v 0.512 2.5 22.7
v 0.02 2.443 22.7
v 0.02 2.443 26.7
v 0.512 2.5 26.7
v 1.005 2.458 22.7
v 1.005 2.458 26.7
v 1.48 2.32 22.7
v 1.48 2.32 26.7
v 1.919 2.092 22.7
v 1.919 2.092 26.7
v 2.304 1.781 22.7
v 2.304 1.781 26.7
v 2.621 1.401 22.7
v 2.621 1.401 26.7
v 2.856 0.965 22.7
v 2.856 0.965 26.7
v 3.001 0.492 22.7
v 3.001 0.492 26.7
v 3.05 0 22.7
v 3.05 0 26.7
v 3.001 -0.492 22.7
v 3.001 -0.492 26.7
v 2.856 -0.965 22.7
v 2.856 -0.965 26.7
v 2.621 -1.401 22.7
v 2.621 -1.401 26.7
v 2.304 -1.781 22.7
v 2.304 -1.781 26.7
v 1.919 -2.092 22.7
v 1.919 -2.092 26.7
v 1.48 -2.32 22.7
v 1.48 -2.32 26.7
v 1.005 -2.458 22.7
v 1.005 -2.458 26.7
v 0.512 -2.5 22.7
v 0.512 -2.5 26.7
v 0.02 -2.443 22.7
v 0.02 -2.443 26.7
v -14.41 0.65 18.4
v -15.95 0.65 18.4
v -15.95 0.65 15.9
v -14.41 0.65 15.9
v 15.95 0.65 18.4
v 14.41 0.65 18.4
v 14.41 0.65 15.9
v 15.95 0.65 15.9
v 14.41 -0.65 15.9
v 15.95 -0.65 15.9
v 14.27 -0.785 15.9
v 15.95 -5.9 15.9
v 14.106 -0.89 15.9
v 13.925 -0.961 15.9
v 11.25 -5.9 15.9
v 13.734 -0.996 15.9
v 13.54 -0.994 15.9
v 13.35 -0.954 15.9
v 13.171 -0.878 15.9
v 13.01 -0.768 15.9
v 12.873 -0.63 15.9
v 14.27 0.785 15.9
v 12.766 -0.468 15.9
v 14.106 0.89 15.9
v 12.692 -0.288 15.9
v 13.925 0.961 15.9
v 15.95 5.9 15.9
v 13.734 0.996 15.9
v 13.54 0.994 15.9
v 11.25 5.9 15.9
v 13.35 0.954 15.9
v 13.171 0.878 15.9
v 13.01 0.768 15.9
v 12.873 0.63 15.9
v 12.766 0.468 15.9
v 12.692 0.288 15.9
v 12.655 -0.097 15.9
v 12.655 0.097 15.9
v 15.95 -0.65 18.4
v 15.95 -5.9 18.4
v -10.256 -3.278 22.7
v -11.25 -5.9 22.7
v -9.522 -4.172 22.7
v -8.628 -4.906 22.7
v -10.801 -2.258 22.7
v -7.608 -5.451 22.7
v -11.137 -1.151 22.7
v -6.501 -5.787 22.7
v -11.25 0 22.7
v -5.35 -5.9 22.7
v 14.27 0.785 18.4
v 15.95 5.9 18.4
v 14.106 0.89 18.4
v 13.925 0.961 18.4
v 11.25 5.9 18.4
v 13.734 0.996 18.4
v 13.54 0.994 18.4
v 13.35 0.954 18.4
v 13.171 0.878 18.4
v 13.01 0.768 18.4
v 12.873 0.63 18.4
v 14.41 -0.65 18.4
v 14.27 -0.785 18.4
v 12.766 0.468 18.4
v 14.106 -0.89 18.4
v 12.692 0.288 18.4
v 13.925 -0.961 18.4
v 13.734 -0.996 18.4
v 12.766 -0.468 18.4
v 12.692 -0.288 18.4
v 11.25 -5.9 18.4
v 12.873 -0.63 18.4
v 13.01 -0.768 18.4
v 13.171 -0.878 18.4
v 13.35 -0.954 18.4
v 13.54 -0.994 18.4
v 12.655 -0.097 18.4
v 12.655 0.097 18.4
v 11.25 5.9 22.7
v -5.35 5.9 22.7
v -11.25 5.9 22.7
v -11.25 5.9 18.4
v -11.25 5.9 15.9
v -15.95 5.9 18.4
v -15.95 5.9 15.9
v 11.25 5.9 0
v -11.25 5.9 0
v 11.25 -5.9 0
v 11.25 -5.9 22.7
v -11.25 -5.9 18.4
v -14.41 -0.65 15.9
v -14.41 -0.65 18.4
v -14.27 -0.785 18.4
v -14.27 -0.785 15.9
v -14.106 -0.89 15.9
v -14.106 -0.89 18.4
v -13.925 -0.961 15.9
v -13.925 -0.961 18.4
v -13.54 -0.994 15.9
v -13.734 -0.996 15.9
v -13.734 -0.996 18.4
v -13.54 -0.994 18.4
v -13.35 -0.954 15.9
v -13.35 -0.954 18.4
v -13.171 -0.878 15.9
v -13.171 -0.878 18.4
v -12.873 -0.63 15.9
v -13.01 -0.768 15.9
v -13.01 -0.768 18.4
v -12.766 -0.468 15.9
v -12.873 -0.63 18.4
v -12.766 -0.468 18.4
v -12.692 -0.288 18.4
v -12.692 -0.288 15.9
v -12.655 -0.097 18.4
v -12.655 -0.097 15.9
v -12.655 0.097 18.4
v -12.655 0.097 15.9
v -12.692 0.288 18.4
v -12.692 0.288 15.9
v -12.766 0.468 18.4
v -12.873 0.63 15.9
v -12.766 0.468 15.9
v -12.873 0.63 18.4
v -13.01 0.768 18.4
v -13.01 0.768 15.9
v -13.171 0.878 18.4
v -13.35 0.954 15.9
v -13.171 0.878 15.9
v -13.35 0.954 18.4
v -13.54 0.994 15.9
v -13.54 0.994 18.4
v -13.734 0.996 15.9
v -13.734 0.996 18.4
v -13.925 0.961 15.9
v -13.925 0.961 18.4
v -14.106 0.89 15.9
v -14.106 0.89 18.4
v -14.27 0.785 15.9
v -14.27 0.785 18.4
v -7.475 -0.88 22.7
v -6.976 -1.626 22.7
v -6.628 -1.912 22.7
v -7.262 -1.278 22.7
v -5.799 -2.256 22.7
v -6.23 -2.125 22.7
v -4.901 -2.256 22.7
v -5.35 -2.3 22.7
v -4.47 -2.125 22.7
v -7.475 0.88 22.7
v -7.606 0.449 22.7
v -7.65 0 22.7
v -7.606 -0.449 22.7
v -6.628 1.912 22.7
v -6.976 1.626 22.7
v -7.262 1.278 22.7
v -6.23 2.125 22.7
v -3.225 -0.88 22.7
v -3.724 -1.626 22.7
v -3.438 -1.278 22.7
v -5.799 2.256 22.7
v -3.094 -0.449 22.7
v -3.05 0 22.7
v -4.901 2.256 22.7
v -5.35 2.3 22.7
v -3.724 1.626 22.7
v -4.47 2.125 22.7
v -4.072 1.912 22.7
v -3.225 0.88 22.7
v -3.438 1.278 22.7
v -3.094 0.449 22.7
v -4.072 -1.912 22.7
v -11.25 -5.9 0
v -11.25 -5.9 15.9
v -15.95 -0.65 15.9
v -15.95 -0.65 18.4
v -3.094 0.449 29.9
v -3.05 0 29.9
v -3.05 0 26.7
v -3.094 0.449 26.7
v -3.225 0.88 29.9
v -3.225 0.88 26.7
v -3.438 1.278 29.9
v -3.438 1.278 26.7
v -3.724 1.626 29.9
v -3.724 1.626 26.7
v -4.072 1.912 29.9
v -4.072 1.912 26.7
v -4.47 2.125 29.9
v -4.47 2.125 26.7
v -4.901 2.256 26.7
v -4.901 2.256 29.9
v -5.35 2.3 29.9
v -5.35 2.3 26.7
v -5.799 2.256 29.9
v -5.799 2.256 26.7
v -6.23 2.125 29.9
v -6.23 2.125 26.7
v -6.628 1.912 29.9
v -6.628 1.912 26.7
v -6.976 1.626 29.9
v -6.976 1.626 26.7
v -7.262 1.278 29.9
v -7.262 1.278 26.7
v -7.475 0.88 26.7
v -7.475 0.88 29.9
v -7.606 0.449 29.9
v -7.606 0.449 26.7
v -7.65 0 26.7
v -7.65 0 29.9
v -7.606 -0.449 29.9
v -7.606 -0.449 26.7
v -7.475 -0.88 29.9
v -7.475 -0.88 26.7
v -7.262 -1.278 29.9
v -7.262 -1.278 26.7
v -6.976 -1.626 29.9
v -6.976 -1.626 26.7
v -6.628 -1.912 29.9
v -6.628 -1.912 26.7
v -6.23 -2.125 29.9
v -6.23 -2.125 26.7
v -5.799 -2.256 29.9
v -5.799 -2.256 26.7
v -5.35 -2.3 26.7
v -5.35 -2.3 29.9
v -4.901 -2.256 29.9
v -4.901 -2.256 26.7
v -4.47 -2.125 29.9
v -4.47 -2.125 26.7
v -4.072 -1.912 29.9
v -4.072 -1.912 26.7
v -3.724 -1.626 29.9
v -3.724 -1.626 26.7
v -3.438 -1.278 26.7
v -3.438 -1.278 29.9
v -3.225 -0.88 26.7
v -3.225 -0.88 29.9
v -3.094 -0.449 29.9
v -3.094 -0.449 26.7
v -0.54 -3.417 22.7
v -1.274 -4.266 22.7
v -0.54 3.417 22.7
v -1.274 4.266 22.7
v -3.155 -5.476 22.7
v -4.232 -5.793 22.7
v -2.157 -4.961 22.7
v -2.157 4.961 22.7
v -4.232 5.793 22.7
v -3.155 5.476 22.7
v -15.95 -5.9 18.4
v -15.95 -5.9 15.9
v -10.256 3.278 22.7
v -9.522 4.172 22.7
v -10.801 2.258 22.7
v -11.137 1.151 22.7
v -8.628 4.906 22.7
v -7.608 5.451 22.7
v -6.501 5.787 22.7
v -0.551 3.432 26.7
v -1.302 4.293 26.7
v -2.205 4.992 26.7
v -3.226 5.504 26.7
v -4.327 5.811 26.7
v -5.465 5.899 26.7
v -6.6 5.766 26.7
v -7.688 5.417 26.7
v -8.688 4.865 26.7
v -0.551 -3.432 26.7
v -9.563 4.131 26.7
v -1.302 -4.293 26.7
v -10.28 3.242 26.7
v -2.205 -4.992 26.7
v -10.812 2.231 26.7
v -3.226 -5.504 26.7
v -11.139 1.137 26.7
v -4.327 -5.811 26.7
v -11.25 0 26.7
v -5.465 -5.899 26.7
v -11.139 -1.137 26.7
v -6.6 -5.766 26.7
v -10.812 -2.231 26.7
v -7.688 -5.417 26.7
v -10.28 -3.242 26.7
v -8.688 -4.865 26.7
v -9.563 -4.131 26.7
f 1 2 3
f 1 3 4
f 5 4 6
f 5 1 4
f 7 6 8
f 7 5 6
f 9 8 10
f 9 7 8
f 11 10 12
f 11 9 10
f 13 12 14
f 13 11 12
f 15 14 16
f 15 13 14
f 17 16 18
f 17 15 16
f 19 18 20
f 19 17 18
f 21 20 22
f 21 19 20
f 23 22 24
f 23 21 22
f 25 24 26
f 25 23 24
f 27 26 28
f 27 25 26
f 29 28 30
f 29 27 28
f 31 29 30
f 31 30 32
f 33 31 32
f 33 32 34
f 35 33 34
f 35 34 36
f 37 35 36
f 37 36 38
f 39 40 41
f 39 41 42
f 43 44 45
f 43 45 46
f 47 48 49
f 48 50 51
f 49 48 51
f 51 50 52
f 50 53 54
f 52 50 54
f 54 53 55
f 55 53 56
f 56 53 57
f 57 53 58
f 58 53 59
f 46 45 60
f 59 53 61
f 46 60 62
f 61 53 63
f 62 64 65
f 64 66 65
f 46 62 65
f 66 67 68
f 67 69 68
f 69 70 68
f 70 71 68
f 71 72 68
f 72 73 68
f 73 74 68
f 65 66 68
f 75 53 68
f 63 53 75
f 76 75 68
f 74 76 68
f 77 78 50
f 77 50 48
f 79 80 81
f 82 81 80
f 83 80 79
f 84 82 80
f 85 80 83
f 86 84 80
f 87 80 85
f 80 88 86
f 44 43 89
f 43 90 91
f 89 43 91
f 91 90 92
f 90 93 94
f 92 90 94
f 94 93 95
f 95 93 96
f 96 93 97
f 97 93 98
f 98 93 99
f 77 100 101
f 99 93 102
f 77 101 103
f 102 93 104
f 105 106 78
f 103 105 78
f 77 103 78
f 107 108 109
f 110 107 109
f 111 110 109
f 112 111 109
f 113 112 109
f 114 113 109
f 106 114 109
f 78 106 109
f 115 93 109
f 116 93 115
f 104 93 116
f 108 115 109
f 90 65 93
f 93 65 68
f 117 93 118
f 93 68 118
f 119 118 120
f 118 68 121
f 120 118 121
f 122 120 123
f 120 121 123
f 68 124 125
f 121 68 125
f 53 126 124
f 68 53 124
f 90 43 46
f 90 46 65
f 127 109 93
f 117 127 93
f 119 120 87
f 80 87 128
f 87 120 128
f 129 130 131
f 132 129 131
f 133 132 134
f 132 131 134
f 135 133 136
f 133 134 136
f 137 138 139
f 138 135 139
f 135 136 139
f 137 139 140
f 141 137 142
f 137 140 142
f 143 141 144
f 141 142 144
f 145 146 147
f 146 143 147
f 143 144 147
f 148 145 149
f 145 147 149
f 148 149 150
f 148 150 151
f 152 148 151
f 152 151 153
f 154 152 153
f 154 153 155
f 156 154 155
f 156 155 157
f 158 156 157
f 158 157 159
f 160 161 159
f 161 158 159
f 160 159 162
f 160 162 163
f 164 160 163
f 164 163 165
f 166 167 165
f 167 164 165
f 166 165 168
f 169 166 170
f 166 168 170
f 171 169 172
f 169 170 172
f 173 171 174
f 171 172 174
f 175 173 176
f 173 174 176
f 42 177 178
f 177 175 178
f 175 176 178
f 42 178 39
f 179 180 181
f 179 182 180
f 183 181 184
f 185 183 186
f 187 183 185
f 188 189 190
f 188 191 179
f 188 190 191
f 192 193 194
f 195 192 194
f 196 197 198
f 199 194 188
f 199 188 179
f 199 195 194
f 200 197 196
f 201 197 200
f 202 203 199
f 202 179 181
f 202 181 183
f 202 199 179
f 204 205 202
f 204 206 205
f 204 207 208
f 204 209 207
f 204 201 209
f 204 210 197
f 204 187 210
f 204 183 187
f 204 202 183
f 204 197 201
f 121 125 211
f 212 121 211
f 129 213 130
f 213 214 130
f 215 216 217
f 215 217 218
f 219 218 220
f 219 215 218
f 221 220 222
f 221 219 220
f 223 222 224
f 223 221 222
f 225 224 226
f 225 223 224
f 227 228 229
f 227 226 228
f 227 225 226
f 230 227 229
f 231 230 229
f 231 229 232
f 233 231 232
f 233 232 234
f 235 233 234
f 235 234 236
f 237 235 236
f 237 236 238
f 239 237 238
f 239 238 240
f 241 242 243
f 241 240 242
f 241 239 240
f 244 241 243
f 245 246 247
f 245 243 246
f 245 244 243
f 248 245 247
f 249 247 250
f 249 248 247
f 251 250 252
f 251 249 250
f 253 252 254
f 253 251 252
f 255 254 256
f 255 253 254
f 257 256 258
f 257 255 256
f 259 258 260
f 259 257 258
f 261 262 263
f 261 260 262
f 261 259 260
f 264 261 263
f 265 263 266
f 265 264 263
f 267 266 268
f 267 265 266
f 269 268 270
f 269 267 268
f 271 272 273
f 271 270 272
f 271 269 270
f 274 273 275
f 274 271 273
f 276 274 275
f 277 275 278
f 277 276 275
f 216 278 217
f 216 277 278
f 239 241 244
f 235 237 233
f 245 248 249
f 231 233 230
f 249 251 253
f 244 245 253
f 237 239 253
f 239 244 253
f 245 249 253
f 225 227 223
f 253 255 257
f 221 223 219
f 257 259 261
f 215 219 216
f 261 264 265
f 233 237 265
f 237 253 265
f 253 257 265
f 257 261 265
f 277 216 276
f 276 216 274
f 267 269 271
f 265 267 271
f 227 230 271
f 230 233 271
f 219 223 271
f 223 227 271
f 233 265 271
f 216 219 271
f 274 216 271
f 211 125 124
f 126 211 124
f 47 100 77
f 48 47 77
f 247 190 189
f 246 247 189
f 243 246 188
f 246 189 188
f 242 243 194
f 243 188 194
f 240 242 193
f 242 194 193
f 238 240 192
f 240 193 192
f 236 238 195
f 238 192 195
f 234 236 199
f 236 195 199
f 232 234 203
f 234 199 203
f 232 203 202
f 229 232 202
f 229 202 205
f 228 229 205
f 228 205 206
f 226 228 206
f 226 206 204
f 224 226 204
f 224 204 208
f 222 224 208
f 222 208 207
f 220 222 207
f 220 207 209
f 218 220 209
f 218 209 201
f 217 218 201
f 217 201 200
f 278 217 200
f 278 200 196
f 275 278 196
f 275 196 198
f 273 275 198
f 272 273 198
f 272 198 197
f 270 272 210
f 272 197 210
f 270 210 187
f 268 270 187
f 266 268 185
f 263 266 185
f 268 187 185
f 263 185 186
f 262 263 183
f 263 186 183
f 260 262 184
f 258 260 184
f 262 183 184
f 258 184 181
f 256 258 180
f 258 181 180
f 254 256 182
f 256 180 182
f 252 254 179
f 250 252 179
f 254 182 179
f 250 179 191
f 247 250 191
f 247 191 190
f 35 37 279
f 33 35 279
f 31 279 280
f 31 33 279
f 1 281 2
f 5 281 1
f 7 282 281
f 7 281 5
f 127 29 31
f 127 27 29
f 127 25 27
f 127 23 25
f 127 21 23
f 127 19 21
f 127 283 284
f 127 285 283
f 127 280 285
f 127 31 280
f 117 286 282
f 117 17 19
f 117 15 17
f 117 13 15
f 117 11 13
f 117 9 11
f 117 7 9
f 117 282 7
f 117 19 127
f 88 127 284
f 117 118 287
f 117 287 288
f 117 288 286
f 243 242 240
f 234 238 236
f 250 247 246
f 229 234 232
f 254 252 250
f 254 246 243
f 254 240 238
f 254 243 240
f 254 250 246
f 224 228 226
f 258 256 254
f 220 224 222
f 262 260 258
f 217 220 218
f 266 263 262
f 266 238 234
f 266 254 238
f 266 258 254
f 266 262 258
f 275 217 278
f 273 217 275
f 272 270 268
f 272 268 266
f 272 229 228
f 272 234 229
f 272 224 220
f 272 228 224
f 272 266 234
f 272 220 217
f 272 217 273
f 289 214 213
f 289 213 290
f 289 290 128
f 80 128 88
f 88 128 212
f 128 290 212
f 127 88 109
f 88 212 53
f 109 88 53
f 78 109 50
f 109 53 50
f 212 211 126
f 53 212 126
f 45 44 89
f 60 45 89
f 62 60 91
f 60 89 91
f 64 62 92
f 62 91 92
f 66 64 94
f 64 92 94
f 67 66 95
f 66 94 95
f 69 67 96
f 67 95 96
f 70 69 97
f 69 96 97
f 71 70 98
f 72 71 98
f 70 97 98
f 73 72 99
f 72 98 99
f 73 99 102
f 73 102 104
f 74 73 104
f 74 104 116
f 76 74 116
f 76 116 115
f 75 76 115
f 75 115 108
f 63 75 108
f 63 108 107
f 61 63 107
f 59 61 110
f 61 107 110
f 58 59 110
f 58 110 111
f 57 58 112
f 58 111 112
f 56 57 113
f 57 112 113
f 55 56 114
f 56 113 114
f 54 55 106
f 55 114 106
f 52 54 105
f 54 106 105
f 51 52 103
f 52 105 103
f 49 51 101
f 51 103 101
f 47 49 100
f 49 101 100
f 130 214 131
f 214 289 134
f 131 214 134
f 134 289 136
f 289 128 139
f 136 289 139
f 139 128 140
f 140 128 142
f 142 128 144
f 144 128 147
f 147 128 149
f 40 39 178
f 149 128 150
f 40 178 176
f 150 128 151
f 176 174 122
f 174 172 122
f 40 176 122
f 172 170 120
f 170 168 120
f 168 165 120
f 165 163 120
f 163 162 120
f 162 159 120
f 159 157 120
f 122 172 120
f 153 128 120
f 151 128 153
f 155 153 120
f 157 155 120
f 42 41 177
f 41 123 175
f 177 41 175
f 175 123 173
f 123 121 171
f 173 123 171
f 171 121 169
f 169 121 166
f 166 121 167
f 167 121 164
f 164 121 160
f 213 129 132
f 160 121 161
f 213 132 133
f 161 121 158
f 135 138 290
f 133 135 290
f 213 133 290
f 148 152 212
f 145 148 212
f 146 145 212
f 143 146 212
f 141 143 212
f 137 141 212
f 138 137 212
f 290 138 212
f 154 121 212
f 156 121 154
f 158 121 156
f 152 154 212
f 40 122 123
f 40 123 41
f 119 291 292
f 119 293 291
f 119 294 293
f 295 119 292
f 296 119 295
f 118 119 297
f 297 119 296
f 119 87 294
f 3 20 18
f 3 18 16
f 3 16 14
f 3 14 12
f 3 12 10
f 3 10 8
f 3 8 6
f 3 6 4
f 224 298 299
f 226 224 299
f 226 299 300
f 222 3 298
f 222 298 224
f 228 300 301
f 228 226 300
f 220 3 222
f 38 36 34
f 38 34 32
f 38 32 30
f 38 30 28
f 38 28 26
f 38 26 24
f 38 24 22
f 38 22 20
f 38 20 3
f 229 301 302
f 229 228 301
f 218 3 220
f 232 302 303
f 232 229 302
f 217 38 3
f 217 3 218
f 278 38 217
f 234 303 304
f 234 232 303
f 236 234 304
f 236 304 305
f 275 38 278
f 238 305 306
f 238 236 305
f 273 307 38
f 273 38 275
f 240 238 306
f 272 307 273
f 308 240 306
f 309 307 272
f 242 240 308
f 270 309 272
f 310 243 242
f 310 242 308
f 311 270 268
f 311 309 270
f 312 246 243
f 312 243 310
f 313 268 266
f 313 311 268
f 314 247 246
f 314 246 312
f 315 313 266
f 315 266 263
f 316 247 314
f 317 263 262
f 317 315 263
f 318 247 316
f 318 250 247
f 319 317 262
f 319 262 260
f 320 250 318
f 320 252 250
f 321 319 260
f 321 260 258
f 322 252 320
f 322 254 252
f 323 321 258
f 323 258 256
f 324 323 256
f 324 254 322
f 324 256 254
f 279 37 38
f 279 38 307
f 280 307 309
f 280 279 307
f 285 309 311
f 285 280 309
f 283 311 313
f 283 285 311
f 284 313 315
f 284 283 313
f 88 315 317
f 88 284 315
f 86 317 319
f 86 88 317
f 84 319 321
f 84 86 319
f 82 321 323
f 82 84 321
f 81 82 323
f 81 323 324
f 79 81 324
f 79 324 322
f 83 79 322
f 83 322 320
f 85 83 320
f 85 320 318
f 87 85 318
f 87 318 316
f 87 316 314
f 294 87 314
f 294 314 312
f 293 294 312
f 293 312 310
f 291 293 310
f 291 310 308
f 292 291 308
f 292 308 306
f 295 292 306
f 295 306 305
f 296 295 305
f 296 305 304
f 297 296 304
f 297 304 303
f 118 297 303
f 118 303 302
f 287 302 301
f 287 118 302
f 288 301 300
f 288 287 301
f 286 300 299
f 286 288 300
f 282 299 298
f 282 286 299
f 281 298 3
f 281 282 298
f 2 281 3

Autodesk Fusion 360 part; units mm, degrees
sketch "Sketch1" plane through (0, 0, 0) normal (0, 0, 1) x (1, 0, 0)
  line L0 (11.25, 5.9) -> (-11.25, 5.9)
  line L1 (-11.25, 5.9) -> (-11.25, -5.9)
  line L2 (-11.25, -5.9) -> (11.25, -5.9)
  line L3 (11.25, -5.9) -> (11.25, 5.9)
  line L4 (11.25, 5.9) -> (-11.25, -5.9) construction
  line L5 (-11.25, 5.9) -> (11.25, -5.9) construction
  dimension "d1" = 22.5
  dimension "d2" = 11.8
extrude "Extrude1" add sketch "Sketch1" along normal blind 22.7 makes body 1
sketch "Sketch2" plane through (11.25, 0, 0) normal (1, 0, 0) x (0, 1, 0)
  line L0 (-5.9, 0) -> (5.9, 0)
  line L1 (5.9, 0) -> (5.9, 22.7)
  line L2 (5.9, 22.7) -> (-5.9, 22.7)
  line L3 (-5.9, 22.7) -> (-5.9, 0)
  line L4 (5.9, 22.7) -> (5.9, 18.4)
  line L5 (5.9, 18.4) -> (-5.9, 18.4)
  line L6 (-5.9, 18.4) -> (-5.9, 15.9)
  line L7 (-5.9, 15.9) -> (5.9, 15.9)
  line L8 (5.9, 15.9) -> (5.9, 18.4)
  dimension "d5" = 4.3
  dimension "d6" = 2.5
extrude "Extrude2" add sketch "Sketch2" along normal blind 4.7 contours L1 L3 L5 L6 L7 L8 bodies 1
sketch "Sketch3" plane through (0, 0, 18.4) normal (0, 0, 1) x (-1, 0, 0)
  line L0 (-11.25, -5.9) -> (-11.25, 5.9)
  line L1 (-11.25, 5.9) -> (-15.95, 5.9)
  line L2 (-15.95, 5.9) -> (-15.95, -5.9)
  line L3 (-15.95, -5.9) -> (-11.25, -5.9)
  line L4 (-15.95, -5.9) -> (-15.95, 0)
  line L5 (-15.95, 0) -> (-13.65, 0)
  line L6 (-14.4099, -0.65) -> (-15.95, -0.65)
  line L7 (-14.4099, 0.65) -> (-15.95, 0.65)
  arc A0 (-14.4099, -0.65) -> (-14.4099, 0.65) centre (-13.65, 0) ccw
  dimension "d9" = 2.3
  dimension "d10" = 2
  dimension "d12" = 0.65
extrude "Extrude3" cut sketch "Sketch3" against normal blind 3 contours L2 L4 L6 L7 A0 bodies 1
mirror "Mirror1" about plane through (0, 0, 0) normal (1, 0, 0) of bodies 1 merged
sketch "Sketch4" plane through (0, 0, 22.7) normal (0, 0, 1) x (-1, 0, 0)
  line L0 (-11.25, 5.9) -> (-11.25, -5.9)
  line L1 (-11.25, -5.9) -> (11.25, -5.9)
  line L2 (11.25, -5.9) -> (11.25, 5.9)
  line L3 (11.25, 5.9) -> (-11.25, 5.9)
  circle A0 centre (5.35, 0) radius 2.3
  arc A1 (-0.0203, 2.4432) -> (-0.0203, -2.4432) centre (-0.55, 0) ccw
  arc A2 (-0.0203, -2.4432) -> (-0.0203, 2.4432) centre (5.35, 0) ccw
  line L4 (5.35, 0) -> (-0.55, 0)
  dimension "d17" = 11.8
  dimension "d18" = 4.6
  dimension "d19" = 5
extrude "Extrude4" add sketch "Sketch4" along normal blind 4 contours A1 A2 bodies 1
sketch "Sketch5" plane through (0, 0, 0) normal (0, 0, 1) x (1, 0, 0)
  circle A0 centre (20, 0) radius 2.3
  dimension "d24" = 4.6
extrude "Extrude6" add sketch "Sketch5" along normal blind 3.2 separate body makes body 2
copy_body "Body->Comp1" bodies 2 removing the originals makes body 3 in component "Component"
component "Component" placed x (1, 0, 0) y (0, -1, 0) z (0, 0, -1) at (-25.35, 0, 29.9)
